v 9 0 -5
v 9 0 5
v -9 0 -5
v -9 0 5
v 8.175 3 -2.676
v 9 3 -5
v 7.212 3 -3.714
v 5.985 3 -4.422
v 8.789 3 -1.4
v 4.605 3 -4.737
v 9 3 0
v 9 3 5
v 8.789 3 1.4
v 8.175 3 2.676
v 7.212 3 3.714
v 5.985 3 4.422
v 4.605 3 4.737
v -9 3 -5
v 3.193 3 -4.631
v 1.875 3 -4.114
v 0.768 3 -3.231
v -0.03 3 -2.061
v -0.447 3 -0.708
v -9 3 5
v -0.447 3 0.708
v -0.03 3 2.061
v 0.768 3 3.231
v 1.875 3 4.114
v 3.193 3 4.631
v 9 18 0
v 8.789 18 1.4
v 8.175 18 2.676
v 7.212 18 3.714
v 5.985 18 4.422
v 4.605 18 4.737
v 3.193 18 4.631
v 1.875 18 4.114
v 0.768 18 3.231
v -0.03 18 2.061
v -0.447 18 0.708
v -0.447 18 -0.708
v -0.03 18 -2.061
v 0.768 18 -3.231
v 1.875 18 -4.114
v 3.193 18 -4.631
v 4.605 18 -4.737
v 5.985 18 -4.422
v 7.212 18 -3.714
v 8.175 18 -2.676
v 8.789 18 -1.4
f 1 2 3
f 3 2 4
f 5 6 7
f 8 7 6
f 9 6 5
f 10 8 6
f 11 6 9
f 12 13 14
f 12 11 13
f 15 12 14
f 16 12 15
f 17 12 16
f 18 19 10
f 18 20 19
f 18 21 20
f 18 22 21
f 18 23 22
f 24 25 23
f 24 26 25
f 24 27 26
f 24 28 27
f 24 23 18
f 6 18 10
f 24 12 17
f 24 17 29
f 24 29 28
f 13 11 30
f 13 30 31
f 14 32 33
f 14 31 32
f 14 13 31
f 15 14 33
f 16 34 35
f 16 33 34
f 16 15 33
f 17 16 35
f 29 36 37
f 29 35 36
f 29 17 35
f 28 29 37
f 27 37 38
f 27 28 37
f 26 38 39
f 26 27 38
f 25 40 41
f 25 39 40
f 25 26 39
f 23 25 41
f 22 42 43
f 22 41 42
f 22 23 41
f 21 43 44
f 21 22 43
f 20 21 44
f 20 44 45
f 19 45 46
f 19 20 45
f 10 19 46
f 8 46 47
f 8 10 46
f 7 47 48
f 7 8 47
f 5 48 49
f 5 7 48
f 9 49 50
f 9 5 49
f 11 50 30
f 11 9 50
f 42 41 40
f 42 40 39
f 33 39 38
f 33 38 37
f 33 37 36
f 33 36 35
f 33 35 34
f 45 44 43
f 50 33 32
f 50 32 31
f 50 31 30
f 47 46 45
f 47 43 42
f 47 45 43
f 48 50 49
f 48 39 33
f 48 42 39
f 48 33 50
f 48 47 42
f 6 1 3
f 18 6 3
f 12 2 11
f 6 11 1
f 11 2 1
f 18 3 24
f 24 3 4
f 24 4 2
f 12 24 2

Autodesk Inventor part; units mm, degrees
ref_plane "YZ Plane" through (0, 0, 0) normal (1, 0, 0) x (0, 1, 0)
ref_plane "XZ Plane" through (0, 0, 0) normal (0, 1, 0) x (-1, 0, 0)
ref_plane "XY Plane" through (0, 0, 0) normal (0, 0, 1) x (1, 0, 0)
sketch "Sketch1" plane through (0, 0, 0) normal (0, 1, 0) x (-1, 0, 0)
  line L0 (9, 5) -> (-9, 5)
  line L1 (-9, 5) -> (-9, -5)
  line L2 (-9, -5) -> (9, -5)
  line L3 (9, -5) -> (9, 5)
  line L4 (9, 5) -> (-9, -5) construction
  line L5 (-9, 5) -> (9, -5) construction
  point P0 (0, 0)
  dimension "d0" = 18
  dimension "d1" = 10
extrude "Extrusion1" add sketch "Sketch1" along normal blind 3
sketch "Sketch2" plane through (0, 3, 0) normal (0, 1, 0) x (1, 0, 0)
  circle A0 centre (4.25, 0) radius 4.75
  line L0 (9, -5) -> (9, 5) projected
  point P0 (0, 0)
  dimension "d4" = 9.5
extrude "Extrusion2" add sketch "Sketch2" along normal blind 15
properties part number "Candado"
